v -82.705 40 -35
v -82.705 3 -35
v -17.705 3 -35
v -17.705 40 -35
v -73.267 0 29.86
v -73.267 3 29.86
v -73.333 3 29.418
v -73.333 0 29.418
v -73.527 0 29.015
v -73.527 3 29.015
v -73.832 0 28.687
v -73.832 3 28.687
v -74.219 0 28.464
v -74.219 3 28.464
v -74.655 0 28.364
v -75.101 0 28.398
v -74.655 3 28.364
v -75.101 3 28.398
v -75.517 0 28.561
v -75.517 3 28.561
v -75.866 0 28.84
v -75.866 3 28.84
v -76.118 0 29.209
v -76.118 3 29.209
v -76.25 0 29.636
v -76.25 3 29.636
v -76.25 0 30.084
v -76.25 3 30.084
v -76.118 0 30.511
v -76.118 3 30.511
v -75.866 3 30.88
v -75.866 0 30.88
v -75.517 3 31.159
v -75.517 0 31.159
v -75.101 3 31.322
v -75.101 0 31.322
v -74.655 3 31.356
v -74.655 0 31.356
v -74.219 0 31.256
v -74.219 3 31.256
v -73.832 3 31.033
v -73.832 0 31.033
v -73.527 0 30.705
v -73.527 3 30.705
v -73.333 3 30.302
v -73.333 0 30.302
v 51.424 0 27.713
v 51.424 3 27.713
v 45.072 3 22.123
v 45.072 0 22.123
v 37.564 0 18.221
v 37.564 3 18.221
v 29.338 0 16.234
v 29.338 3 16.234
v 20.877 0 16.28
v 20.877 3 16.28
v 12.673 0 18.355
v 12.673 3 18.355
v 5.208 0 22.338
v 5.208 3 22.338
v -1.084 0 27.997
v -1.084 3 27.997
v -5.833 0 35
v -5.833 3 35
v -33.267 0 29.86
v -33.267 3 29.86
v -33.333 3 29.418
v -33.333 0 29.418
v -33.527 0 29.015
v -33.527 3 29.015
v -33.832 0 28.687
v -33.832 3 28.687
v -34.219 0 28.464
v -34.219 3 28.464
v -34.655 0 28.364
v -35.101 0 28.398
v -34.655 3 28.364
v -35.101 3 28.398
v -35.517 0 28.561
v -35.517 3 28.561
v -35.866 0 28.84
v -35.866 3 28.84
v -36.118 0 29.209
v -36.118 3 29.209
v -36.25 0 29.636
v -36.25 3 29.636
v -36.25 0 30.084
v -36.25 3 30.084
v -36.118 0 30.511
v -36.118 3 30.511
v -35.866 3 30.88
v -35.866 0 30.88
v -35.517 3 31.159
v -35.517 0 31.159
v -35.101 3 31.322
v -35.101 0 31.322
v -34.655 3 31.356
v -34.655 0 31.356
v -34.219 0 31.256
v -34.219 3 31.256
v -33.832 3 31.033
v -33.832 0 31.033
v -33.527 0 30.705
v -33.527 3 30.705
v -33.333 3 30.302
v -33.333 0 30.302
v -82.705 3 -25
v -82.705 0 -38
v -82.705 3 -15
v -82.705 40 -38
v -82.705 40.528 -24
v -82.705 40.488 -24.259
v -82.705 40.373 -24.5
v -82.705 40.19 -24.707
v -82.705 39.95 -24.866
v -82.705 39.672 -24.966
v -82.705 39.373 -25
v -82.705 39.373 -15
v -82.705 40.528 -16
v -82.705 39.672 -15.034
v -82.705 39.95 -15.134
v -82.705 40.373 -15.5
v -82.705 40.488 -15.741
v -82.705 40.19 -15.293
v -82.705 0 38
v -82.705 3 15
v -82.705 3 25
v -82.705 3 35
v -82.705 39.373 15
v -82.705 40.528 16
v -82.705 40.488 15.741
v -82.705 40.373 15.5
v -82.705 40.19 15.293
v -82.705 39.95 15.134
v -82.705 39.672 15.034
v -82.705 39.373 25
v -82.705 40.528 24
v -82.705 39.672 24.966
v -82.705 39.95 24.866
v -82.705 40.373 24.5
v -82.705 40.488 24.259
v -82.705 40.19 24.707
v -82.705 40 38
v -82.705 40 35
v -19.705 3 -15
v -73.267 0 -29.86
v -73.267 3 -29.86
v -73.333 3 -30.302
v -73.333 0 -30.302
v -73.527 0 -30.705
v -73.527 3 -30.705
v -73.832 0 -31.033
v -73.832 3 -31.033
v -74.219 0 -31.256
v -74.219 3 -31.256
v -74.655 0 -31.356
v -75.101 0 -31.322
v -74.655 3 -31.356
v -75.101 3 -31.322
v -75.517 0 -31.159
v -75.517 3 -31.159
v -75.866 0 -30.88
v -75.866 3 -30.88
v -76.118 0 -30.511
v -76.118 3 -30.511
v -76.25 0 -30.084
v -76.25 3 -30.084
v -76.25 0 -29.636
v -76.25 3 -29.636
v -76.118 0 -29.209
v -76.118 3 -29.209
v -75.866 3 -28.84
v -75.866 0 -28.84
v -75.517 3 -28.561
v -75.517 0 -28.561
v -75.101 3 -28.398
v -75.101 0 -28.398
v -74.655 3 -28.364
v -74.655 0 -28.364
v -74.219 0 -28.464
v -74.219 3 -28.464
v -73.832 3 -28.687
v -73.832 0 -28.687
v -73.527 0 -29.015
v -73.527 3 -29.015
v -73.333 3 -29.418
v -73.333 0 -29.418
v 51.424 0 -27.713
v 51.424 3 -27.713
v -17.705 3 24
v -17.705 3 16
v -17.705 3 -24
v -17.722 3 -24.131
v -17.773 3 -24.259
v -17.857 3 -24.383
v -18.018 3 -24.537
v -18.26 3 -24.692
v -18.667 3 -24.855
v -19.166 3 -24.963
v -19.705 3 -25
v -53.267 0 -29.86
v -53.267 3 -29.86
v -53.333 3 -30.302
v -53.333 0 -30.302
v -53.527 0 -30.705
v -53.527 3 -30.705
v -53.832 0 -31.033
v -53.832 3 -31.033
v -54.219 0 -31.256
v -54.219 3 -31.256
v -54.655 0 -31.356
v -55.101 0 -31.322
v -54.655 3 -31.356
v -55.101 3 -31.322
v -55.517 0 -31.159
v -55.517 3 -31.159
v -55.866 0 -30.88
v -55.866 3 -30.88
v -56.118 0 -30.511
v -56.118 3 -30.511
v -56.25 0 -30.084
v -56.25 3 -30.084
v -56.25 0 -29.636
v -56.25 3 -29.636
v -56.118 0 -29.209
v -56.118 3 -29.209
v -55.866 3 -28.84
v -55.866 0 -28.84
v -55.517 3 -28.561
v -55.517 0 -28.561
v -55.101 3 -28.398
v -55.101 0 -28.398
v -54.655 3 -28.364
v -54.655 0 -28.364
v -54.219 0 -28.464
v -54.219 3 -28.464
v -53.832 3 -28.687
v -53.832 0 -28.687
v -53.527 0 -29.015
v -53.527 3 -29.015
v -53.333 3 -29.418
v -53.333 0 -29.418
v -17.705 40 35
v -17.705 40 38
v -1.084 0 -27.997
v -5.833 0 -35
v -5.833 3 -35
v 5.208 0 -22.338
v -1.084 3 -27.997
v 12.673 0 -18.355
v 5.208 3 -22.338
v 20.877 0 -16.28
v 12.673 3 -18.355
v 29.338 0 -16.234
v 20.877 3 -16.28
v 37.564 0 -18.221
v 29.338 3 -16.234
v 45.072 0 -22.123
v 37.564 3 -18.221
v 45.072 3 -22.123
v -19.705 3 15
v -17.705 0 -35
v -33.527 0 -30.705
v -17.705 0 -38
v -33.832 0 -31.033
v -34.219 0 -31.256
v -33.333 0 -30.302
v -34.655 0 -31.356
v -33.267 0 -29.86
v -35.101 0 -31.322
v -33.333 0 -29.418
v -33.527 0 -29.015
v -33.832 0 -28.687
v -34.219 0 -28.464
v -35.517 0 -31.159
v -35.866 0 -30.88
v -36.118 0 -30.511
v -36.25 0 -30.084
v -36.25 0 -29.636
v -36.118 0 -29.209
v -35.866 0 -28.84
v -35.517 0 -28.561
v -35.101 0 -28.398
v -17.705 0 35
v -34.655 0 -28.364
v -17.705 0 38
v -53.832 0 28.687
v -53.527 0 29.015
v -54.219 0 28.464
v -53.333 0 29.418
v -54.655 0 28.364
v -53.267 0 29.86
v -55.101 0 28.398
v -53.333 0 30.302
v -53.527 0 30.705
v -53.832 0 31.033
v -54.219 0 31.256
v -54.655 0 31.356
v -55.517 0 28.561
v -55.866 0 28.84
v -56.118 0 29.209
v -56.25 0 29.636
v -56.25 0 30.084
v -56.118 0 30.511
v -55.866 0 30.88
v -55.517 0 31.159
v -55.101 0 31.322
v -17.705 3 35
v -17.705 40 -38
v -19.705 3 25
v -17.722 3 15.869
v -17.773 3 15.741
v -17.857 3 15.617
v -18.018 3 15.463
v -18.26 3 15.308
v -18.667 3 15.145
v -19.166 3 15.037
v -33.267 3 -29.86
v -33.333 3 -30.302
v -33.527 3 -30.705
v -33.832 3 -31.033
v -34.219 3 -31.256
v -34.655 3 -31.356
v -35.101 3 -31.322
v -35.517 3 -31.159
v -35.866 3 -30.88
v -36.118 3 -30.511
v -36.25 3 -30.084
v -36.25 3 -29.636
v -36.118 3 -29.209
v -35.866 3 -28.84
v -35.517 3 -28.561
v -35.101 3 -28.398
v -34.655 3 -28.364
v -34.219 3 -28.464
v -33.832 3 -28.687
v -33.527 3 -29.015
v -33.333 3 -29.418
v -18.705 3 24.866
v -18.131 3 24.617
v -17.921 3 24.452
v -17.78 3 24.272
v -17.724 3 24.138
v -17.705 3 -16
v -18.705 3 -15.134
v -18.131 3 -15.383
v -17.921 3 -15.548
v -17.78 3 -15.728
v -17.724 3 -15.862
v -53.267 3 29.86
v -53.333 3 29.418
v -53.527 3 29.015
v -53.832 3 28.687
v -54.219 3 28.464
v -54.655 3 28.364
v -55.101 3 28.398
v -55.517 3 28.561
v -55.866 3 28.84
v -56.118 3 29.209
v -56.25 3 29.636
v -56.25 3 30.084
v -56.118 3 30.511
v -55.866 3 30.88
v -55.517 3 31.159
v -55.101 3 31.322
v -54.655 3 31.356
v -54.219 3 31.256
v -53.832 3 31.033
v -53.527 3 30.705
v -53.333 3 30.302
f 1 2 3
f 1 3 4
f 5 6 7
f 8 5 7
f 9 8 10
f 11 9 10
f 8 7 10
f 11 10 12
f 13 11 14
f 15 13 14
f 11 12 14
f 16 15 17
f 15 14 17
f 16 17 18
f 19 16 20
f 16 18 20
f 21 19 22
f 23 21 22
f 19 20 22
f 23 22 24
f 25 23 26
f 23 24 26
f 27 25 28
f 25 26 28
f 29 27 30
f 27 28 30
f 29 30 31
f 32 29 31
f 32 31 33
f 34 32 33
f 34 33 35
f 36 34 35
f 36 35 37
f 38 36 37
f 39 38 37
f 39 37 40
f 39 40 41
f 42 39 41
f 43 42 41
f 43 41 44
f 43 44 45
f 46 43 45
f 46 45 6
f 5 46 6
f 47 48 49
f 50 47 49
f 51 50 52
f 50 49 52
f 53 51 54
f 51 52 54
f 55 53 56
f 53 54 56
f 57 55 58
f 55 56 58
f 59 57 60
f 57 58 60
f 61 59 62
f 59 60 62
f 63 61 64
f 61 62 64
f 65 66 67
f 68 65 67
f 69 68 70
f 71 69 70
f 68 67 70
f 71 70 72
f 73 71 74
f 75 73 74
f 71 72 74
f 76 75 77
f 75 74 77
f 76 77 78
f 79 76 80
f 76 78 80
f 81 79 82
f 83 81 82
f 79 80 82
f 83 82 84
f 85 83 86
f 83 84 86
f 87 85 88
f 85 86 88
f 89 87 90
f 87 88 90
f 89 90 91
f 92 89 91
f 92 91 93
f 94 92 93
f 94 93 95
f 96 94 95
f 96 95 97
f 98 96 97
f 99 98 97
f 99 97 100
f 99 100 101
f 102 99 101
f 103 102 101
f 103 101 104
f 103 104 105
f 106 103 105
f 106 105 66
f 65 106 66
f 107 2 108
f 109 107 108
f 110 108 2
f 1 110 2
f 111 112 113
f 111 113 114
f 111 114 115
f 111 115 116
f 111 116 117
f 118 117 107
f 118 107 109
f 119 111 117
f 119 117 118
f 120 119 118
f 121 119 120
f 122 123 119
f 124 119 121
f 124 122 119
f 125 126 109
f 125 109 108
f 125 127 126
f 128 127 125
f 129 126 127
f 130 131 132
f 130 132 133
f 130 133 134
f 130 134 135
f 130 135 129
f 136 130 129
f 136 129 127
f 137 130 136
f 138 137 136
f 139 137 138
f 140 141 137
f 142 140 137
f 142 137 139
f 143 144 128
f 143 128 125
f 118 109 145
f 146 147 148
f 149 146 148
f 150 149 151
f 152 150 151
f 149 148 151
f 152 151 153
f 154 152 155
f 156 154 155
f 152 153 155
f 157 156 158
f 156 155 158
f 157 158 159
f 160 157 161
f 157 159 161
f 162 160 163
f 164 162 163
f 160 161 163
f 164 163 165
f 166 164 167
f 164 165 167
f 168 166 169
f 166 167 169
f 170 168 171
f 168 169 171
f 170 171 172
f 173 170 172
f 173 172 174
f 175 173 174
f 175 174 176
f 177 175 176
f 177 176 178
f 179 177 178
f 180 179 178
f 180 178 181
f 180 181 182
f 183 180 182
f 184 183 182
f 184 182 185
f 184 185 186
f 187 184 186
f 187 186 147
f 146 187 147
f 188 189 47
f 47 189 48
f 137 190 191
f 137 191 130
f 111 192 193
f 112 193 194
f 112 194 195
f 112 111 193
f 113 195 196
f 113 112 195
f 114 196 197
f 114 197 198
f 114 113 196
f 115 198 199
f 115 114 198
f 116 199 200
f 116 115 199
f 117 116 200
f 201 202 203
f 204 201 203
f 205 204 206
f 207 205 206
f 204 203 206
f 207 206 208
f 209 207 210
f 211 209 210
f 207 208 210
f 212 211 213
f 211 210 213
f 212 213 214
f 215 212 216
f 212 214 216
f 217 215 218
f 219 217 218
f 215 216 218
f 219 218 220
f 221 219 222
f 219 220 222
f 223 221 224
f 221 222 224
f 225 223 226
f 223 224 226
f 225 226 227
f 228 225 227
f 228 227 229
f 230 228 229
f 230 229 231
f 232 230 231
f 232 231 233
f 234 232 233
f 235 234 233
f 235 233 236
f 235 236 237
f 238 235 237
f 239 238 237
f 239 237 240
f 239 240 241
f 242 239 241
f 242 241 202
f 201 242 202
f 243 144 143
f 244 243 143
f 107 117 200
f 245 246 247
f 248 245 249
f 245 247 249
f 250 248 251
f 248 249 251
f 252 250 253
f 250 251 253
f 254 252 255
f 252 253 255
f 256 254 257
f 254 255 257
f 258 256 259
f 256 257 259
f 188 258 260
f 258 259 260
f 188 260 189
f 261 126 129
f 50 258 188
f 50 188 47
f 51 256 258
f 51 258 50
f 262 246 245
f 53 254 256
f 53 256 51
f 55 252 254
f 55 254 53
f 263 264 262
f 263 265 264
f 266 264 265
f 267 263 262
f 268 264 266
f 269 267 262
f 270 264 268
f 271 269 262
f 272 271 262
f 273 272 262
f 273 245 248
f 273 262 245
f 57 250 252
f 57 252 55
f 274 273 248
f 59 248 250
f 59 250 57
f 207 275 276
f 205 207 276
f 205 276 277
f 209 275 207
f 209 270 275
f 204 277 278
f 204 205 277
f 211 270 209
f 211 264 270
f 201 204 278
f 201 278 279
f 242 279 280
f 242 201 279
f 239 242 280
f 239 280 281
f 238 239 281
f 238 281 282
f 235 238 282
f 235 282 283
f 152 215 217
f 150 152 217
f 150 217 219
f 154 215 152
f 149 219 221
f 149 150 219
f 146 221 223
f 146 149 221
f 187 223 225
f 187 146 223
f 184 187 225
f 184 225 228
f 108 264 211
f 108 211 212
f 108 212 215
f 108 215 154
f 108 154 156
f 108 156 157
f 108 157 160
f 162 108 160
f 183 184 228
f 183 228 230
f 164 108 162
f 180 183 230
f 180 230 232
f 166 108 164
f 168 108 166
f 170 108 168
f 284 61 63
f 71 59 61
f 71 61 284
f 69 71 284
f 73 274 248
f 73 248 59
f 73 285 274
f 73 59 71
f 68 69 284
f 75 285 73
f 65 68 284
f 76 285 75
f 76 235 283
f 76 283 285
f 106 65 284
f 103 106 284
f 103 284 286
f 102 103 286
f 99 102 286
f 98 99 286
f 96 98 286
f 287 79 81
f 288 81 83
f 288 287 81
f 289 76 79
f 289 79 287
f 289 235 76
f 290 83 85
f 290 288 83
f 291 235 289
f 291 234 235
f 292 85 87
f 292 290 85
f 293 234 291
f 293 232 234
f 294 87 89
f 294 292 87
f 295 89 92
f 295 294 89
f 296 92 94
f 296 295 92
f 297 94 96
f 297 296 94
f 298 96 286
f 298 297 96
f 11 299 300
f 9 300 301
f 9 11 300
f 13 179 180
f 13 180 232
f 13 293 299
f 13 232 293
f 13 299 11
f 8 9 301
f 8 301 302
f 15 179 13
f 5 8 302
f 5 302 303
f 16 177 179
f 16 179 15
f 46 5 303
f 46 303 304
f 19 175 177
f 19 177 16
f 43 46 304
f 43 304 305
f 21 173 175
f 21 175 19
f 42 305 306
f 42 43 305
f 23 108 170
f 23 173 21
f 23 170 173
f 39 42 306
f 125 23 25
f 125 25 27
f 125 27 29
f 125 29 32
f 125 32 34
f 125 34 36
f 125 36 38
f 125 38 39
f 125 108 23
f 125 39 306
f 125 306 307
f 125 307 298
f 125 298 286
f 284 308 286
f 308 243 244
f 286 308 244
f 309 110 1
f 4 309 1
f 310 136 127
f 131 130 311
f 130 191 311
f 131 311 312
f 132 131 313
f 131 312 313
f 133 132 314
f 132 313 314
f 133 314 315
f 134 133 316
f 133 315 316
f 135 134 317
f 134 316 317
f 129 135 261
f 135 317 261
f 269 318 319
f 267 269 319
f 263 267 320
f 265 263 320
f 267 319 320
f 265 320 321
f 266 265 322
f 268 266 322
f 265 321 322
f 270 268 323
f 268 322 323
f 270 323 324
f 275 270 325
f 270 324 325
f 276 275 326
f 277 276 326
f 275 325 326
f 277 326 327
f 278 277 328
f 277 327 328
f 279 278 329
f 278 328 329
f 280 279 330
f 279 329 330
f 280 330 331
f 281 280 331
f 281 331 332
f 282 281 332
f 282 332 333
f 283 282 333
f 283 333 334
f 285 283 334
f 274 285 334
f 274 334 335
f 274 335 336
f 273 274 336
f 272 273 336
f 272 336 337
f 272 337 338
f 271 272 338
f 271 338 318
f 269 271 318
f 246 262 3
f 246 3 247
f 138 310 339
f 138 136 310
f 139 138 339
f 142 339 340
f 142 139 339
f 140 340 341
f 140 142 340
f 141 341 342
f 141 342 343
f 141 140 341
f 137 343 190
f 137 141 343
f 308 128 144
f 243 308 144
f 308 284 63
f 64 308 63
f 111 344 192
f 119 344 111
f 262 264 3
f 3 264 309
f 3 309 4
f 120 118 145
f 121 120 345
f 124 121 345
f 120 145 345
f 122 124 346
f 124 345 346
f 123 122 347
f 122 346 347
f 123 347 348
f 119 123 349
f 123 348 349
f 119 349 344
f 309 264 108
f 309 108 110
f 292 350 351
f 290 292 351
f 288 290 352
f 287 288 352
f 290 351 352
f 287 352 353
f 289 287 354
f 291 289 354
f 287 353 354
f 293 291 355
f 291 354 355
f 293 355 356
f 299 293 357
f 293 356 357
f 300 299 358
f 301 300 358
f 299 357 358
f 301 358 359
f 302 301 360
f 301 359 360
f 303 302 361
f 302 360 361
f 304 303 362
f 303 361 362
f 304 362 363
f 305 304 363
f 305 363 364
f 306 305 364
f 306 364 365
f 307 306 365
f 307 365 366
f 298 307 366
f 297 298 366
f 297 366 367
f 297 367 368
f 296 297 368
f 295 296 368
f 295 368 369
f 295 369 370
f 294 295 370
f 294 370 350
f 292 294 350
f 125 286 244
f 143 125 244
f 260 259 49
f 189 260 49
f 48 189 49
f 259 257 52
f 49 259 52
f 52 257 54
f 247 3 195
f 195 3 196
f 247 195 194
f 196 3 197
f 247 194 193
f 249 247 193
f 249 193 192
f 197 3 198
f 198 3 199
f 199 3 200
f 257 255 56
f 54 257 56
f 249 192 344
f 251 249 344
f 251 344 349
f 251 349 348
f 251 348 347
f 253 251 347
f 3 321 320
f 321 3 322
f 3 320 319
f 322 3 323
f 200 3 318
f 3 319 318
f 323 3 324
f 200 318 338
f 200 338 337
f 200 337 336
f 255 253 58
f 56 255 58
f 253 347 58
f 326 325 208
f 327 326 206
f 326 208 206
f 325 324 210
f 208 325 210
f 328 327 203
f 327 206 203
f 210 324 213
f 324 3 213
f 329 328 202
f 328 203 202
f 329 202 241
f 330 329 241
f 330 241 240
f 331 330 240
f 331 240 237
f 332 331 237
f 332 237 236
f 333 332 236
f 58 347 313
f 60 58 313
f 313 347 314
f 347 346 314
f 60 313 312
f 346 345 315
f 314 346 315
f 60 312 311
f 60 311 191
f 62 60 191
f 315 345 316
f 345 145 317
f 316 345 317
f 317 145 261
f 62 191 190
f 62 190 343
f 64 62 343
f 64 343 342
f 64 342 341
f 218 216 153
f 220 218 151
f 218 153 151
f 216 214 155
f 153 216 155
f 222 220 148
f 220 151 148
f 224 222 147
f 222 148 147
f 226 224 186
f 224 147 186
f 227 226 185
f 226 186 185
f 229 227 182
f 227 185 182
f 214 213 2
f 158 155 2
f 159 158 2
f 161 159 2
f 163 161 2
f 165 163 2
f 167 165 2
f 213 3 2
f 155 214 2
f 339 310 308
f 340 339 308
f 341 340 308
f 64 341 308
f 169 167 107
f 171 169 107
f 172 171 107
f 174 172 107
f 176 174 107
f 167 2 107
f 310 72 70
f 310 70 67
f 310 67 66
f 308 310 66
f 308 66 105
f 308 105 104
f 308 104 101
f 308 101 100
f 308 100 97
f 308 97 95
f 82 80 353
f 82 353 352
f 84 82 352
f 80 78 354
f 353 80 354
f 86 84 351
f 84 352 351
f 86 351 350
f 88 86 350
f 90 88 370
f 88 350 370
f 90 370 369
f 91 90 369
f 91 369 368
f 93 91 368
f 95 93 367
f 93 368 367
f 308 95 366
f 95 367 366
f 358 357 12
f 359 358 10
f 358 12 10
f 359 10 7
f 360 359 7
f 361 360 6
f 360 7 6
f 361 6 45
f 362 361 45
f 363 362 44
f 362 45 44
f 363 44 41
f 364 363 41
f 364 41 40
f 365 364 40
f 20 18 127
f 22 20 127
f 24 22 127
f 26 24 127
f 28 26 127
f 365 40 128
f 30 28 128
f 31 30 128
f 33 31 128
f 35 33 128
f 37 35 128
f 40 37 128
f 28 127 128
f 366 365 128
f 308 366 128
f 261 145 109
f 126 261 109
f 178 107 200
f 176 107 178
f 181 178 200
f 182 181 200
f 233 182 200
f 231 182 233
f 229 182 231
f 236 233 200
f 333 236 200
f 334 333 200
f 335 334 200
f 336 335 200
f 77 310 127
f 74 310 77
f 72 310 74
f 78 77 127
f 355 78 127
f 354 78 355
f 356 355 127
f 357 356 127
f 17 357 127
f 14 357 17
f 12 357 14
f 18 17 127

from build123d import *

# Parameters (mm, degrees)
SKETCH_1_W           = 220
SKETCH_1_H           = 70
EXTRUDE_1_DEPTH      = 3
EXTRUDE_2_DEPTH      = 25
EXTRUDE_2_DEPTH_BACK = 25
SKETCH_6_W           = 30
SKETCH_6_H           = 37.527767497
CUT_EXTRUDE_4_DEPTH  = 221
SKETCH_7_R           = 35
CUT_EXTRUDE_5_DEPTH  = 4
SKETCH_8_W           = 3
SKETCH_8_H           = 40
EXTRUDE_3_DEPTH      = 65
SKETCH_9_R           = 1.5
CUT_EXTRUDE_6_DEPTH  = 4
FILLET_5_R           = 1
SKETCH_12_R          = 1.5
CUT_EXTRUDE_8_DEPTH  = 4


with BuildPart() as part:
    # 草图1 → 凸台-拉伸1 (new body)
    with BuildSketch(Plane(origin=(0, 0, 0), x_dir=(1, 0, 0), z_dir=(0, 1, 0))):
        with Locations((27.295373665, 0)):
            Rectangle(SKETCH_1_W, SKETCH_1_H)
    extrude(amount=EXTRUDE_1_DEPTH)

    # 草图2 → 凸台-拉伸2 (add, two sides)
    with BuildSketch(Plane.XY) as extrude_2_sk:
        Polygon((-82.704626335, 40.527767497), (-82.704626335, 3), (-17.704626335, 3), align=None)
    extrude(amount=EXTRUDE_2_DEPTH)
    extrude(extrude_2_sk.sketch, amount=-EXTRUDE_2_DEPTH_BACK)

    # 草图6 → 切除-拉伸4 (cut, through all)
    with BuildSketch(Plane.ZY.offset(82.704626335)):
        with Locations((0, 21.763883748)):
            Rectangle(SKETCH_6_W, SKETCH_6_H)
    extrude(amount=-CUT_EXTRUDE_4_DEPTH, mode=Mode.SUBTRACT)

    # 草图7 → 切除-拉伸5 (cut, through all)
    with BuildSketch(Plane(origin=(0, 3, 0), x_dir=(1, 0, 0), z_dir=(0, 1, 0))):
        with Locations((25.295373665, 51)):
            Circle(SKETCH_7_R)
        with Locations((25.295373665, -51)):
            Circle(SKETCH_7_R)
    extrude(amount=-CUT_EXTRUDE_5_DEPTH, mode=Mode.SUBTRACT)

    # 草图8 → 凸台-拉伸3 (add)
    with BuildSketch(Plane.ZY.offset(82.704626335)):
        with Locations((36.5, 20)):
            Rectangle(SKETCH_8_W, SKETCH_8_H)
        with Locations((-36.5, 20)):
            Rectangle(SKETCH_8_W, SKETCH_8_H)
    extrude(amount=-EXTRUDE_3_DEPTH)

    # 草图9 → 切除-拉伸6 (cut, through all)
    with BuildSketch(Plane(origin=(0, 3, 0), x_dir=(1, 0, 0), z_dir=(0, 1, 0))):
        with Locations((-74.766784803, 29.860059225)):
            Circle(SKETCH_9_R)
        with Locations((-54.766784803, 29.860059225)):
            Circle(SKETCH_9_R)
        with Locations((-34.766784803, 29.860059225)):
            Circle(SKETCH_9_R)
        with Locations((-34.766784803, -29.860059225)):
            Circle(SKETCH_9_R)
        with Locations((-54.766784803, -29.860059225)):
            Circle(SKETCH_9_R)
        with Locations((-74.766784803, -29.860059225)):
            Circle(SKETCH_9_R)
        with Locations((68.031562246, 22)):
            Circle(SKETCH_9_R)
        with Locations((88.031562246, 22)):
            Circle(SKETCH_9_R)
        with Locations((108.031562246, 22)):
            Circle(SKETCH_9_R)
        with Locations((108.031562246, -22)):
            Circle(SKETCH_9_R)
        with Locations((88.031562246, -22)):
            Circle(SKETCH_9_R)
        with Locations((68.031562246, -22)):
            Circle(SKETCH_9_R)
        with Locations((128.031562246, 22)):
            Circle(SKETCH_9_R)
        with Locations((128.031562246, -22)):
            Circle(SKETCH_9_R)
    extrude(amount=-CUT_EXTRUDE_6_DEPTH, mode=Mode.SUBTRACT)

    # 圆角5
    fillet_5_edges = [part.edges().sort_by_distance(p)[0] for p in [
        (-50.204626335, 21.763883749, -25),
        (-50.204626335, 21.763883749, 25),
        (-50.204626335, 21.763883749, -15),
        (-50.204626335, 21.763883749, 15),
    ]]
    fillet(fillet_5_edges, radius=FILLET_5_R)

    # 草图12 → 切除-拉伸8 (cut, through all)
    with BuildSketch(Plane(origin=(0, 3, 0), x_dir=(1, 0, 0), z_dir=(0, 1, 0))):
        with BuildLine():
            Line((51.424138498, 27.712929589), (51.424138498, 0))
            Line((51.424138498, 0), (51.424138498, -27.712929589))
            ThreePointArc((51.424138498, -27.712929589), (54.155060508, -31.198018398), (56.424138498, -35))
            Line((56.424138498, -35), (137.295373665, -35))
            Line((137.295373665, -35), (137.295373665, 35))
            Line((137.295373665, 35), (56.424138498, 35))
            ThreePointArc((56.424138498, 35), (54.155060508, 31.198018398), (51.424138498, 27.712929589))
        make_face()
        with Locations((68.031562246, -22)):
            Circle(SKETCH_12_R, mode=Mode.SUBTRACT)
        with Locations((88.031562246, -22)):
            Circle(SKETCH_12_R, mode=Mode.SUBTRACT)
        with Locations((108.031562246, -22)):
            Circle(SKETCH_12_R, mode=Mode.SUBTRACT)
        with Locations((128.031562246, -22)):
            Circle(SKETCH_12_R, mode=Mode.SUBTRACT)
        with Locations((68.031562246, 22)):
            Circle(SKETCH_12_R, mode=Mode.SUBTRACT)
        with Locations((88.031562246, 22)):
            Circle(SKETCH_12_R, mode=Mode.SUBTRACT)
        with Locations((108.031562246, 22)):
            Circle(SKETCH_12_R, mode=Mode.SUBTRACT)
        with Locations((128.031562246, 22)):
            Circle(SKETCH_12_R, mode=Mode.SUBTRACT)
    extrude(amount=-CUT_EXTRUDE_8_DEPTH, mode=Mode.SUBTRACT)


solid = part.part
